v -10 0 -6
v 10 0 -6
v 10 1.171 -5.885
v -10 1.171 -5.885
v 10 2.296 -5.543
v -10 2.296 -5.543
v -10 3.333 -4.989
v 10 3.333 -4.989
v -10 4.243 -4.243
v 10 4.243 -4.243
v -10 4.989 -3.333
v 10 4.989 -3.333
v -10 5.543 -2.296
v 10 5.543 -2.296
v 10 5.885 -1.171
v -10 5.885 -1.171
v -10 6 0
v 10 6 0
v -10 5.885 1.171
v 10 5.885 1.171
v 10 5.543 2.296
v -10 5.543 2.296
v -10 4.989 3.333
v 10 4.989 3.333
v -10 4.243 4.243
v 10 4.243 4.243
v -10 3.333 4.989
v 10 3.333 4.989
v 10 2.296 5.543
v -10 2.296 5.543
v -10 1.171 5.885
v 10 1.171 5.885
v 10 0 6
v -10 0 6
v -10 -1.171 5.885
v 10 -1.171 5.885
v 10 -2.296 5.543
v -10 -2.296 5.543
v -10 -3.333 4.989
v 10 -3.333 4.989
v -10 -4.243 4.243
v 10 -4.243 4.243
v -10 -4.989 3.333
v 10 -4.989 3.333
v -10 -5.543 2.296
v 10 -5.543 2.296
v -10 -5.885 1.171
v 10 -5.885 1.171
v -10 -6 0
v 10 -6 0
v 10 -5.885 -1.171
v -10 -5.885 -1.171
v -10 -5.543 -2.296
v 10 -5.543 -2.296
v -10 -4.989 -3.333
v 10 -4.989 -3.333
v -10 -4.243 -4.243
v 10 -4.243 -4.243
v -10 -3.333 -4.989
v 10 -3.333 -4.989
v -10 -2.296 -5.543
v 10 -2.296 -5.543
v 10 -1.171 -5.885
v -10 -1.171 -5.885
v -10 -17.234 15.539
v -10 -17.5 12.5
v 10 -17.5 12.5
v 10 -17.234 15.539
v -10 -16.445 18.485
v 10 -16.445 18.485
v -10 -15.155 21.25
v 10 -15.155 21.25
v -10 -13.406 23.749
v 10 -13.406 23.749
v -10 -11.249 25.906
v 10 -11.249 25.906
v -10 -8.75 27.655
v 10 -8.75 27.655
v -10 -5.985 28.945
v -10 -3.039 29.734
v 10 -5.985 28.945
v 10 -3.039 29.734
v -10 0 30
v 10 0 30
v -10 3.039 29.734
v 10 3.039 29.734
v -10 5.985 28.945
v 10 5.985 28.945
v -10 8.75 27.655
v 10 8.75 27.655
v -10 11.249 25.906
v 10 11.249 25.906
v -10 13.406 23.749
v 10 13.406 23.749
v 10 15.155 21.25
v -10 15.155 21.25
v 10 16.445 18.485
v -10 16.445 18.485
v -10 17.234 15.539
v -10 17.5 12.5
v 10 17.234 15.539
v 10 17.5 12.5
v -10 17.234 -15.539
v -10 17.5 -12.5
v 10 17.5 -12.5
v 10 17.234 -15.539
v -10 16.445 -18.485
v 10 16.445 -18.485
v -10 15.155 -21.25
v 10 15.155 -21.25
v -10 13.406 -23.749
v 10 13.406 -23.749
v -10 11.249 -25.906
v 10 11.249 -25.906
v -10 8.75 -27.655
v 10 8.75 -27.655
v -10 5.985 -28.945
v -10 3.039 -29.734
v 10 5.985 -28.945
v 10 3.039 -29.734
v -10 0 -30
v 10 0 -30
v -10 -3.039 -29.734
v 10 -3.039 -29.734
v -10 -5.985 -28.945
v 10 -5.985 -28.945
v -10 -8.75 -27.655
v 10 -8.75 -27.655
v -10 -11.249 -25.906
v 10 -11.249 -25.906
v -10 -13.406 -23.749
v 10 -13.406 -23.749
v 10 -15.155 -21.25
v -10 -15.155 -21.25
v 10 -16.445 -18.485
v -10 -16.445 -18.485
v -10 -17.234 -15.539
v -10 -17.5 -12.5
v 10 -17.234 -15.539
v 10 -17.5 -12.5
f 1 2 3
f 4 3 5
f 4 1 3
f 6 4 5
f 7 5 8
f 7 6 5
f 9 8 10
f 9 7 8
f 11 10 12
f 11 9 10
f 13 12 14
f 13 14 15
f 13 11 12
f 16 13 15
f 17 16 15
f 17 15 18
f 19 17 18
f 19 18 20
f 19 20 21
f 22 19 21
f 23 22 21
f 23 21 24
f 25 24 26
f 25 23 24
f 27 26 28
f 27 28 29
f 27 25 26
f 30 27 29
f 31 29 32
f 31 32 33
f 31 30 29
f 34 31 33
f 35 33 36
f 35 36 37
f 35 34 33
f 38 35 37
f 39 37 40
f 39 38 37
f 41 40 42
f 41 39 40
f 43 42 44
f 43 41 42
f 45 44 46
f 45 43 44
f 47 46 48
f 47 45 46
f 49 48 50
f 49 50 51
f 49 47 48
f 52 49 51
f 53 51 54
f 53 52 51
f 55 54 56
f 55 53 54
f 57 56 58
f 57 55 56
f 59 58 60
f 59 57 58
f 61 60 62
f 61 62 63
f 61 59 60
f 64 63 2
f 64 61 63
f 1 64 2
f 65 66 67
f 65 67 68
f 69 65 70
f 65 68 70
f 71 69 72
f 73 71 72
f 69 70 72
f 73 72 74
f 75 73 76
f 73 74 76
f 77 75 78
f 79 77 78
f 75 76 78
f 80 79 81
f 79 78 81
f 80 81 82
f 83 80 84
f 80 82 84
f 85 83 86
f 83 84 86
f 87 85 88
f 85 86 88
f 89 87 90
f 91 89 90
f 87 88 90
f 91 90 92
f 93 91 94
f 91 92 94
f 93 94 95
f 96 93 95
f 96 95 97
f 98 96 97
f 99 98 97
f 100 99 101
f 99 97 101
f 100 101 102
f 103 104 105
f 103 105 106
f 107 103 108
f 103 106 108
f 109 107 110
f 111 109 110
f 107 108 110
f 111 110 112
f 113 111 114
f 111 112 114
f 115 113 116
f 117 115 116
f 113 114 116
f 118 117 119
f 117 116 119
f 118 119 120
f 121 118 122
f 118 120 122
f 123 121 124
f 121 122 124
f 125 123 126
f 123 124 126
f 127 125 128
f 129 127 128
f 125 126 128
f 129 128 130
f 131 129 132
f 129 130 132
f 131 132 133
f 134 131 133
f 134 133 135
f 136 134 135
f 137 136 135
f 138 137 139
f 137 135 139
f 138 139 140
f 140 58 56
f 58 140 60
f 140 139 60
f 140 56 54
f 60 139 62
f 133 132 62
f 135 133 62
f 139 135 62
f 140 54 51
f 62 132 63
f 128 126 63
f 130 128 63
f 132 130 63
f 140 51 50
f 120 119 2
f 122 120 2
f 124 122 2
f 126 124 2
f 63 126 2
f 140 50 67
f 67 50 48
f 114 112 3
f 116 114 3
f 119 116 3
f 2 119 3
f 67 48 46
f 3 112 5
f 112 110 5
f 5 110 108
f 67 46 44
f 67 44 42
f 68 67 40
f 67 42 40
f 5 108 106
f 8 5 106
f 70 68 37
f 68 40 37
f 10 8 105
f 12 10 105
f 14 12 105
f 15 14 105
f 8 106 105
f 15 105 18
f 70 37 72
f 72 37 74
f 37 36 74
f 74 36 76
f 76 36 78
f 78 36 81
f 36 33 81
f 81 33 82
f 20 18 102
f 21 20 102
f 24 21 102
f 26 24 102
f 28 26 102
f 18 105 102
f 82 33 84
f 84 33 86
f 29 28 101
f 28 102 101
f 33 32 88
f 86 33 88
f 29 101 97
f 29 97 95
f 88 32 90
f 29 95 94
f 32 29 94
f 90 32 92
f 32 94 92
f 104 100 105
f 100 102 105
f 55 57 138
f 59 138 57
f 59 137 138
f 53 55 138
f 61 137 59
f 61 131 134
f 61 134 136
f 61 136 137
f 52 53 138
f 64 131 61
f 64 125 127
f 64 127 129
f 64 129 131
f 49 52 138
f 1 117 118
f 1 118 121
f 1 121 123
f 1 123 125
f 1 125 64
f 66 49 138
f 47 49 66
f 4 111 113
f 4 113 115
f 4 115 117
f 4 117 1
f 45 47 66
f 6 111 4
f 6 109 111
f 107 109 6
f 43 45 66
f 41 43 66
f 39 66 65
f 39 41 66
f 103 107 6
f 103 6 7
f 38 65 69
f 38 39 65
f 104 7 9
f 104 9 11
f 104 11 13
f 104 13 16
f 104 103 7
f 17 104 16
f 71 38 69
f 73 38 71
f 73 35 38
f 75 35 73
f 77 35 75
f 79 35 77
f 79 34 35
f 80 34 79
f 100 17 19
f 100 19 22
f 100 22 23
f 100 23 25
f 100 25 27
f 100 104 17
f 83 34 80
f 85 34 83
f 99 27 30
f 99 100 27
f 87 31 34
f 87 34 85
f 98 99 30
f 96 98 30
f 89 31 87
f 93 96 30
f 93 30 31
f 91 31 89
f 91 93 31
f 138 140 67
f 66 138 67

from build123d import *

# Parameters (mm, degrees)
SKETCH1_R           = 6
BOSS_EXTRUDE1_DEPTH = 10


with BuildPart() as part:
    # Sketch1 → Boss-Extrude1 (new, symmetric)
    with BuildSketch(Plane(origin=(0, 0, 0), x_dir=(0, 0, -1), z_dir=(1, 0, 0))):
        with BuildLine():
            Line((12.5, -17.5), (-12.5, -17.5))
            ThreePointArc((-12.5, -17.5), (-30, 0), (-12.5, 17.5))
            Line((-12.5, 17.5), (12.5, 17.5))
            ThreePointArc((12.5, 17.5), (30, 0), (12.5, -17.5))
        make_face()
        Circle(SKETCH1_R, mode=Mode.SUBTRACT)
    extrude(amount=BOSS_EXTRUDE1_DEPTH, both=True)


solid = part.part
